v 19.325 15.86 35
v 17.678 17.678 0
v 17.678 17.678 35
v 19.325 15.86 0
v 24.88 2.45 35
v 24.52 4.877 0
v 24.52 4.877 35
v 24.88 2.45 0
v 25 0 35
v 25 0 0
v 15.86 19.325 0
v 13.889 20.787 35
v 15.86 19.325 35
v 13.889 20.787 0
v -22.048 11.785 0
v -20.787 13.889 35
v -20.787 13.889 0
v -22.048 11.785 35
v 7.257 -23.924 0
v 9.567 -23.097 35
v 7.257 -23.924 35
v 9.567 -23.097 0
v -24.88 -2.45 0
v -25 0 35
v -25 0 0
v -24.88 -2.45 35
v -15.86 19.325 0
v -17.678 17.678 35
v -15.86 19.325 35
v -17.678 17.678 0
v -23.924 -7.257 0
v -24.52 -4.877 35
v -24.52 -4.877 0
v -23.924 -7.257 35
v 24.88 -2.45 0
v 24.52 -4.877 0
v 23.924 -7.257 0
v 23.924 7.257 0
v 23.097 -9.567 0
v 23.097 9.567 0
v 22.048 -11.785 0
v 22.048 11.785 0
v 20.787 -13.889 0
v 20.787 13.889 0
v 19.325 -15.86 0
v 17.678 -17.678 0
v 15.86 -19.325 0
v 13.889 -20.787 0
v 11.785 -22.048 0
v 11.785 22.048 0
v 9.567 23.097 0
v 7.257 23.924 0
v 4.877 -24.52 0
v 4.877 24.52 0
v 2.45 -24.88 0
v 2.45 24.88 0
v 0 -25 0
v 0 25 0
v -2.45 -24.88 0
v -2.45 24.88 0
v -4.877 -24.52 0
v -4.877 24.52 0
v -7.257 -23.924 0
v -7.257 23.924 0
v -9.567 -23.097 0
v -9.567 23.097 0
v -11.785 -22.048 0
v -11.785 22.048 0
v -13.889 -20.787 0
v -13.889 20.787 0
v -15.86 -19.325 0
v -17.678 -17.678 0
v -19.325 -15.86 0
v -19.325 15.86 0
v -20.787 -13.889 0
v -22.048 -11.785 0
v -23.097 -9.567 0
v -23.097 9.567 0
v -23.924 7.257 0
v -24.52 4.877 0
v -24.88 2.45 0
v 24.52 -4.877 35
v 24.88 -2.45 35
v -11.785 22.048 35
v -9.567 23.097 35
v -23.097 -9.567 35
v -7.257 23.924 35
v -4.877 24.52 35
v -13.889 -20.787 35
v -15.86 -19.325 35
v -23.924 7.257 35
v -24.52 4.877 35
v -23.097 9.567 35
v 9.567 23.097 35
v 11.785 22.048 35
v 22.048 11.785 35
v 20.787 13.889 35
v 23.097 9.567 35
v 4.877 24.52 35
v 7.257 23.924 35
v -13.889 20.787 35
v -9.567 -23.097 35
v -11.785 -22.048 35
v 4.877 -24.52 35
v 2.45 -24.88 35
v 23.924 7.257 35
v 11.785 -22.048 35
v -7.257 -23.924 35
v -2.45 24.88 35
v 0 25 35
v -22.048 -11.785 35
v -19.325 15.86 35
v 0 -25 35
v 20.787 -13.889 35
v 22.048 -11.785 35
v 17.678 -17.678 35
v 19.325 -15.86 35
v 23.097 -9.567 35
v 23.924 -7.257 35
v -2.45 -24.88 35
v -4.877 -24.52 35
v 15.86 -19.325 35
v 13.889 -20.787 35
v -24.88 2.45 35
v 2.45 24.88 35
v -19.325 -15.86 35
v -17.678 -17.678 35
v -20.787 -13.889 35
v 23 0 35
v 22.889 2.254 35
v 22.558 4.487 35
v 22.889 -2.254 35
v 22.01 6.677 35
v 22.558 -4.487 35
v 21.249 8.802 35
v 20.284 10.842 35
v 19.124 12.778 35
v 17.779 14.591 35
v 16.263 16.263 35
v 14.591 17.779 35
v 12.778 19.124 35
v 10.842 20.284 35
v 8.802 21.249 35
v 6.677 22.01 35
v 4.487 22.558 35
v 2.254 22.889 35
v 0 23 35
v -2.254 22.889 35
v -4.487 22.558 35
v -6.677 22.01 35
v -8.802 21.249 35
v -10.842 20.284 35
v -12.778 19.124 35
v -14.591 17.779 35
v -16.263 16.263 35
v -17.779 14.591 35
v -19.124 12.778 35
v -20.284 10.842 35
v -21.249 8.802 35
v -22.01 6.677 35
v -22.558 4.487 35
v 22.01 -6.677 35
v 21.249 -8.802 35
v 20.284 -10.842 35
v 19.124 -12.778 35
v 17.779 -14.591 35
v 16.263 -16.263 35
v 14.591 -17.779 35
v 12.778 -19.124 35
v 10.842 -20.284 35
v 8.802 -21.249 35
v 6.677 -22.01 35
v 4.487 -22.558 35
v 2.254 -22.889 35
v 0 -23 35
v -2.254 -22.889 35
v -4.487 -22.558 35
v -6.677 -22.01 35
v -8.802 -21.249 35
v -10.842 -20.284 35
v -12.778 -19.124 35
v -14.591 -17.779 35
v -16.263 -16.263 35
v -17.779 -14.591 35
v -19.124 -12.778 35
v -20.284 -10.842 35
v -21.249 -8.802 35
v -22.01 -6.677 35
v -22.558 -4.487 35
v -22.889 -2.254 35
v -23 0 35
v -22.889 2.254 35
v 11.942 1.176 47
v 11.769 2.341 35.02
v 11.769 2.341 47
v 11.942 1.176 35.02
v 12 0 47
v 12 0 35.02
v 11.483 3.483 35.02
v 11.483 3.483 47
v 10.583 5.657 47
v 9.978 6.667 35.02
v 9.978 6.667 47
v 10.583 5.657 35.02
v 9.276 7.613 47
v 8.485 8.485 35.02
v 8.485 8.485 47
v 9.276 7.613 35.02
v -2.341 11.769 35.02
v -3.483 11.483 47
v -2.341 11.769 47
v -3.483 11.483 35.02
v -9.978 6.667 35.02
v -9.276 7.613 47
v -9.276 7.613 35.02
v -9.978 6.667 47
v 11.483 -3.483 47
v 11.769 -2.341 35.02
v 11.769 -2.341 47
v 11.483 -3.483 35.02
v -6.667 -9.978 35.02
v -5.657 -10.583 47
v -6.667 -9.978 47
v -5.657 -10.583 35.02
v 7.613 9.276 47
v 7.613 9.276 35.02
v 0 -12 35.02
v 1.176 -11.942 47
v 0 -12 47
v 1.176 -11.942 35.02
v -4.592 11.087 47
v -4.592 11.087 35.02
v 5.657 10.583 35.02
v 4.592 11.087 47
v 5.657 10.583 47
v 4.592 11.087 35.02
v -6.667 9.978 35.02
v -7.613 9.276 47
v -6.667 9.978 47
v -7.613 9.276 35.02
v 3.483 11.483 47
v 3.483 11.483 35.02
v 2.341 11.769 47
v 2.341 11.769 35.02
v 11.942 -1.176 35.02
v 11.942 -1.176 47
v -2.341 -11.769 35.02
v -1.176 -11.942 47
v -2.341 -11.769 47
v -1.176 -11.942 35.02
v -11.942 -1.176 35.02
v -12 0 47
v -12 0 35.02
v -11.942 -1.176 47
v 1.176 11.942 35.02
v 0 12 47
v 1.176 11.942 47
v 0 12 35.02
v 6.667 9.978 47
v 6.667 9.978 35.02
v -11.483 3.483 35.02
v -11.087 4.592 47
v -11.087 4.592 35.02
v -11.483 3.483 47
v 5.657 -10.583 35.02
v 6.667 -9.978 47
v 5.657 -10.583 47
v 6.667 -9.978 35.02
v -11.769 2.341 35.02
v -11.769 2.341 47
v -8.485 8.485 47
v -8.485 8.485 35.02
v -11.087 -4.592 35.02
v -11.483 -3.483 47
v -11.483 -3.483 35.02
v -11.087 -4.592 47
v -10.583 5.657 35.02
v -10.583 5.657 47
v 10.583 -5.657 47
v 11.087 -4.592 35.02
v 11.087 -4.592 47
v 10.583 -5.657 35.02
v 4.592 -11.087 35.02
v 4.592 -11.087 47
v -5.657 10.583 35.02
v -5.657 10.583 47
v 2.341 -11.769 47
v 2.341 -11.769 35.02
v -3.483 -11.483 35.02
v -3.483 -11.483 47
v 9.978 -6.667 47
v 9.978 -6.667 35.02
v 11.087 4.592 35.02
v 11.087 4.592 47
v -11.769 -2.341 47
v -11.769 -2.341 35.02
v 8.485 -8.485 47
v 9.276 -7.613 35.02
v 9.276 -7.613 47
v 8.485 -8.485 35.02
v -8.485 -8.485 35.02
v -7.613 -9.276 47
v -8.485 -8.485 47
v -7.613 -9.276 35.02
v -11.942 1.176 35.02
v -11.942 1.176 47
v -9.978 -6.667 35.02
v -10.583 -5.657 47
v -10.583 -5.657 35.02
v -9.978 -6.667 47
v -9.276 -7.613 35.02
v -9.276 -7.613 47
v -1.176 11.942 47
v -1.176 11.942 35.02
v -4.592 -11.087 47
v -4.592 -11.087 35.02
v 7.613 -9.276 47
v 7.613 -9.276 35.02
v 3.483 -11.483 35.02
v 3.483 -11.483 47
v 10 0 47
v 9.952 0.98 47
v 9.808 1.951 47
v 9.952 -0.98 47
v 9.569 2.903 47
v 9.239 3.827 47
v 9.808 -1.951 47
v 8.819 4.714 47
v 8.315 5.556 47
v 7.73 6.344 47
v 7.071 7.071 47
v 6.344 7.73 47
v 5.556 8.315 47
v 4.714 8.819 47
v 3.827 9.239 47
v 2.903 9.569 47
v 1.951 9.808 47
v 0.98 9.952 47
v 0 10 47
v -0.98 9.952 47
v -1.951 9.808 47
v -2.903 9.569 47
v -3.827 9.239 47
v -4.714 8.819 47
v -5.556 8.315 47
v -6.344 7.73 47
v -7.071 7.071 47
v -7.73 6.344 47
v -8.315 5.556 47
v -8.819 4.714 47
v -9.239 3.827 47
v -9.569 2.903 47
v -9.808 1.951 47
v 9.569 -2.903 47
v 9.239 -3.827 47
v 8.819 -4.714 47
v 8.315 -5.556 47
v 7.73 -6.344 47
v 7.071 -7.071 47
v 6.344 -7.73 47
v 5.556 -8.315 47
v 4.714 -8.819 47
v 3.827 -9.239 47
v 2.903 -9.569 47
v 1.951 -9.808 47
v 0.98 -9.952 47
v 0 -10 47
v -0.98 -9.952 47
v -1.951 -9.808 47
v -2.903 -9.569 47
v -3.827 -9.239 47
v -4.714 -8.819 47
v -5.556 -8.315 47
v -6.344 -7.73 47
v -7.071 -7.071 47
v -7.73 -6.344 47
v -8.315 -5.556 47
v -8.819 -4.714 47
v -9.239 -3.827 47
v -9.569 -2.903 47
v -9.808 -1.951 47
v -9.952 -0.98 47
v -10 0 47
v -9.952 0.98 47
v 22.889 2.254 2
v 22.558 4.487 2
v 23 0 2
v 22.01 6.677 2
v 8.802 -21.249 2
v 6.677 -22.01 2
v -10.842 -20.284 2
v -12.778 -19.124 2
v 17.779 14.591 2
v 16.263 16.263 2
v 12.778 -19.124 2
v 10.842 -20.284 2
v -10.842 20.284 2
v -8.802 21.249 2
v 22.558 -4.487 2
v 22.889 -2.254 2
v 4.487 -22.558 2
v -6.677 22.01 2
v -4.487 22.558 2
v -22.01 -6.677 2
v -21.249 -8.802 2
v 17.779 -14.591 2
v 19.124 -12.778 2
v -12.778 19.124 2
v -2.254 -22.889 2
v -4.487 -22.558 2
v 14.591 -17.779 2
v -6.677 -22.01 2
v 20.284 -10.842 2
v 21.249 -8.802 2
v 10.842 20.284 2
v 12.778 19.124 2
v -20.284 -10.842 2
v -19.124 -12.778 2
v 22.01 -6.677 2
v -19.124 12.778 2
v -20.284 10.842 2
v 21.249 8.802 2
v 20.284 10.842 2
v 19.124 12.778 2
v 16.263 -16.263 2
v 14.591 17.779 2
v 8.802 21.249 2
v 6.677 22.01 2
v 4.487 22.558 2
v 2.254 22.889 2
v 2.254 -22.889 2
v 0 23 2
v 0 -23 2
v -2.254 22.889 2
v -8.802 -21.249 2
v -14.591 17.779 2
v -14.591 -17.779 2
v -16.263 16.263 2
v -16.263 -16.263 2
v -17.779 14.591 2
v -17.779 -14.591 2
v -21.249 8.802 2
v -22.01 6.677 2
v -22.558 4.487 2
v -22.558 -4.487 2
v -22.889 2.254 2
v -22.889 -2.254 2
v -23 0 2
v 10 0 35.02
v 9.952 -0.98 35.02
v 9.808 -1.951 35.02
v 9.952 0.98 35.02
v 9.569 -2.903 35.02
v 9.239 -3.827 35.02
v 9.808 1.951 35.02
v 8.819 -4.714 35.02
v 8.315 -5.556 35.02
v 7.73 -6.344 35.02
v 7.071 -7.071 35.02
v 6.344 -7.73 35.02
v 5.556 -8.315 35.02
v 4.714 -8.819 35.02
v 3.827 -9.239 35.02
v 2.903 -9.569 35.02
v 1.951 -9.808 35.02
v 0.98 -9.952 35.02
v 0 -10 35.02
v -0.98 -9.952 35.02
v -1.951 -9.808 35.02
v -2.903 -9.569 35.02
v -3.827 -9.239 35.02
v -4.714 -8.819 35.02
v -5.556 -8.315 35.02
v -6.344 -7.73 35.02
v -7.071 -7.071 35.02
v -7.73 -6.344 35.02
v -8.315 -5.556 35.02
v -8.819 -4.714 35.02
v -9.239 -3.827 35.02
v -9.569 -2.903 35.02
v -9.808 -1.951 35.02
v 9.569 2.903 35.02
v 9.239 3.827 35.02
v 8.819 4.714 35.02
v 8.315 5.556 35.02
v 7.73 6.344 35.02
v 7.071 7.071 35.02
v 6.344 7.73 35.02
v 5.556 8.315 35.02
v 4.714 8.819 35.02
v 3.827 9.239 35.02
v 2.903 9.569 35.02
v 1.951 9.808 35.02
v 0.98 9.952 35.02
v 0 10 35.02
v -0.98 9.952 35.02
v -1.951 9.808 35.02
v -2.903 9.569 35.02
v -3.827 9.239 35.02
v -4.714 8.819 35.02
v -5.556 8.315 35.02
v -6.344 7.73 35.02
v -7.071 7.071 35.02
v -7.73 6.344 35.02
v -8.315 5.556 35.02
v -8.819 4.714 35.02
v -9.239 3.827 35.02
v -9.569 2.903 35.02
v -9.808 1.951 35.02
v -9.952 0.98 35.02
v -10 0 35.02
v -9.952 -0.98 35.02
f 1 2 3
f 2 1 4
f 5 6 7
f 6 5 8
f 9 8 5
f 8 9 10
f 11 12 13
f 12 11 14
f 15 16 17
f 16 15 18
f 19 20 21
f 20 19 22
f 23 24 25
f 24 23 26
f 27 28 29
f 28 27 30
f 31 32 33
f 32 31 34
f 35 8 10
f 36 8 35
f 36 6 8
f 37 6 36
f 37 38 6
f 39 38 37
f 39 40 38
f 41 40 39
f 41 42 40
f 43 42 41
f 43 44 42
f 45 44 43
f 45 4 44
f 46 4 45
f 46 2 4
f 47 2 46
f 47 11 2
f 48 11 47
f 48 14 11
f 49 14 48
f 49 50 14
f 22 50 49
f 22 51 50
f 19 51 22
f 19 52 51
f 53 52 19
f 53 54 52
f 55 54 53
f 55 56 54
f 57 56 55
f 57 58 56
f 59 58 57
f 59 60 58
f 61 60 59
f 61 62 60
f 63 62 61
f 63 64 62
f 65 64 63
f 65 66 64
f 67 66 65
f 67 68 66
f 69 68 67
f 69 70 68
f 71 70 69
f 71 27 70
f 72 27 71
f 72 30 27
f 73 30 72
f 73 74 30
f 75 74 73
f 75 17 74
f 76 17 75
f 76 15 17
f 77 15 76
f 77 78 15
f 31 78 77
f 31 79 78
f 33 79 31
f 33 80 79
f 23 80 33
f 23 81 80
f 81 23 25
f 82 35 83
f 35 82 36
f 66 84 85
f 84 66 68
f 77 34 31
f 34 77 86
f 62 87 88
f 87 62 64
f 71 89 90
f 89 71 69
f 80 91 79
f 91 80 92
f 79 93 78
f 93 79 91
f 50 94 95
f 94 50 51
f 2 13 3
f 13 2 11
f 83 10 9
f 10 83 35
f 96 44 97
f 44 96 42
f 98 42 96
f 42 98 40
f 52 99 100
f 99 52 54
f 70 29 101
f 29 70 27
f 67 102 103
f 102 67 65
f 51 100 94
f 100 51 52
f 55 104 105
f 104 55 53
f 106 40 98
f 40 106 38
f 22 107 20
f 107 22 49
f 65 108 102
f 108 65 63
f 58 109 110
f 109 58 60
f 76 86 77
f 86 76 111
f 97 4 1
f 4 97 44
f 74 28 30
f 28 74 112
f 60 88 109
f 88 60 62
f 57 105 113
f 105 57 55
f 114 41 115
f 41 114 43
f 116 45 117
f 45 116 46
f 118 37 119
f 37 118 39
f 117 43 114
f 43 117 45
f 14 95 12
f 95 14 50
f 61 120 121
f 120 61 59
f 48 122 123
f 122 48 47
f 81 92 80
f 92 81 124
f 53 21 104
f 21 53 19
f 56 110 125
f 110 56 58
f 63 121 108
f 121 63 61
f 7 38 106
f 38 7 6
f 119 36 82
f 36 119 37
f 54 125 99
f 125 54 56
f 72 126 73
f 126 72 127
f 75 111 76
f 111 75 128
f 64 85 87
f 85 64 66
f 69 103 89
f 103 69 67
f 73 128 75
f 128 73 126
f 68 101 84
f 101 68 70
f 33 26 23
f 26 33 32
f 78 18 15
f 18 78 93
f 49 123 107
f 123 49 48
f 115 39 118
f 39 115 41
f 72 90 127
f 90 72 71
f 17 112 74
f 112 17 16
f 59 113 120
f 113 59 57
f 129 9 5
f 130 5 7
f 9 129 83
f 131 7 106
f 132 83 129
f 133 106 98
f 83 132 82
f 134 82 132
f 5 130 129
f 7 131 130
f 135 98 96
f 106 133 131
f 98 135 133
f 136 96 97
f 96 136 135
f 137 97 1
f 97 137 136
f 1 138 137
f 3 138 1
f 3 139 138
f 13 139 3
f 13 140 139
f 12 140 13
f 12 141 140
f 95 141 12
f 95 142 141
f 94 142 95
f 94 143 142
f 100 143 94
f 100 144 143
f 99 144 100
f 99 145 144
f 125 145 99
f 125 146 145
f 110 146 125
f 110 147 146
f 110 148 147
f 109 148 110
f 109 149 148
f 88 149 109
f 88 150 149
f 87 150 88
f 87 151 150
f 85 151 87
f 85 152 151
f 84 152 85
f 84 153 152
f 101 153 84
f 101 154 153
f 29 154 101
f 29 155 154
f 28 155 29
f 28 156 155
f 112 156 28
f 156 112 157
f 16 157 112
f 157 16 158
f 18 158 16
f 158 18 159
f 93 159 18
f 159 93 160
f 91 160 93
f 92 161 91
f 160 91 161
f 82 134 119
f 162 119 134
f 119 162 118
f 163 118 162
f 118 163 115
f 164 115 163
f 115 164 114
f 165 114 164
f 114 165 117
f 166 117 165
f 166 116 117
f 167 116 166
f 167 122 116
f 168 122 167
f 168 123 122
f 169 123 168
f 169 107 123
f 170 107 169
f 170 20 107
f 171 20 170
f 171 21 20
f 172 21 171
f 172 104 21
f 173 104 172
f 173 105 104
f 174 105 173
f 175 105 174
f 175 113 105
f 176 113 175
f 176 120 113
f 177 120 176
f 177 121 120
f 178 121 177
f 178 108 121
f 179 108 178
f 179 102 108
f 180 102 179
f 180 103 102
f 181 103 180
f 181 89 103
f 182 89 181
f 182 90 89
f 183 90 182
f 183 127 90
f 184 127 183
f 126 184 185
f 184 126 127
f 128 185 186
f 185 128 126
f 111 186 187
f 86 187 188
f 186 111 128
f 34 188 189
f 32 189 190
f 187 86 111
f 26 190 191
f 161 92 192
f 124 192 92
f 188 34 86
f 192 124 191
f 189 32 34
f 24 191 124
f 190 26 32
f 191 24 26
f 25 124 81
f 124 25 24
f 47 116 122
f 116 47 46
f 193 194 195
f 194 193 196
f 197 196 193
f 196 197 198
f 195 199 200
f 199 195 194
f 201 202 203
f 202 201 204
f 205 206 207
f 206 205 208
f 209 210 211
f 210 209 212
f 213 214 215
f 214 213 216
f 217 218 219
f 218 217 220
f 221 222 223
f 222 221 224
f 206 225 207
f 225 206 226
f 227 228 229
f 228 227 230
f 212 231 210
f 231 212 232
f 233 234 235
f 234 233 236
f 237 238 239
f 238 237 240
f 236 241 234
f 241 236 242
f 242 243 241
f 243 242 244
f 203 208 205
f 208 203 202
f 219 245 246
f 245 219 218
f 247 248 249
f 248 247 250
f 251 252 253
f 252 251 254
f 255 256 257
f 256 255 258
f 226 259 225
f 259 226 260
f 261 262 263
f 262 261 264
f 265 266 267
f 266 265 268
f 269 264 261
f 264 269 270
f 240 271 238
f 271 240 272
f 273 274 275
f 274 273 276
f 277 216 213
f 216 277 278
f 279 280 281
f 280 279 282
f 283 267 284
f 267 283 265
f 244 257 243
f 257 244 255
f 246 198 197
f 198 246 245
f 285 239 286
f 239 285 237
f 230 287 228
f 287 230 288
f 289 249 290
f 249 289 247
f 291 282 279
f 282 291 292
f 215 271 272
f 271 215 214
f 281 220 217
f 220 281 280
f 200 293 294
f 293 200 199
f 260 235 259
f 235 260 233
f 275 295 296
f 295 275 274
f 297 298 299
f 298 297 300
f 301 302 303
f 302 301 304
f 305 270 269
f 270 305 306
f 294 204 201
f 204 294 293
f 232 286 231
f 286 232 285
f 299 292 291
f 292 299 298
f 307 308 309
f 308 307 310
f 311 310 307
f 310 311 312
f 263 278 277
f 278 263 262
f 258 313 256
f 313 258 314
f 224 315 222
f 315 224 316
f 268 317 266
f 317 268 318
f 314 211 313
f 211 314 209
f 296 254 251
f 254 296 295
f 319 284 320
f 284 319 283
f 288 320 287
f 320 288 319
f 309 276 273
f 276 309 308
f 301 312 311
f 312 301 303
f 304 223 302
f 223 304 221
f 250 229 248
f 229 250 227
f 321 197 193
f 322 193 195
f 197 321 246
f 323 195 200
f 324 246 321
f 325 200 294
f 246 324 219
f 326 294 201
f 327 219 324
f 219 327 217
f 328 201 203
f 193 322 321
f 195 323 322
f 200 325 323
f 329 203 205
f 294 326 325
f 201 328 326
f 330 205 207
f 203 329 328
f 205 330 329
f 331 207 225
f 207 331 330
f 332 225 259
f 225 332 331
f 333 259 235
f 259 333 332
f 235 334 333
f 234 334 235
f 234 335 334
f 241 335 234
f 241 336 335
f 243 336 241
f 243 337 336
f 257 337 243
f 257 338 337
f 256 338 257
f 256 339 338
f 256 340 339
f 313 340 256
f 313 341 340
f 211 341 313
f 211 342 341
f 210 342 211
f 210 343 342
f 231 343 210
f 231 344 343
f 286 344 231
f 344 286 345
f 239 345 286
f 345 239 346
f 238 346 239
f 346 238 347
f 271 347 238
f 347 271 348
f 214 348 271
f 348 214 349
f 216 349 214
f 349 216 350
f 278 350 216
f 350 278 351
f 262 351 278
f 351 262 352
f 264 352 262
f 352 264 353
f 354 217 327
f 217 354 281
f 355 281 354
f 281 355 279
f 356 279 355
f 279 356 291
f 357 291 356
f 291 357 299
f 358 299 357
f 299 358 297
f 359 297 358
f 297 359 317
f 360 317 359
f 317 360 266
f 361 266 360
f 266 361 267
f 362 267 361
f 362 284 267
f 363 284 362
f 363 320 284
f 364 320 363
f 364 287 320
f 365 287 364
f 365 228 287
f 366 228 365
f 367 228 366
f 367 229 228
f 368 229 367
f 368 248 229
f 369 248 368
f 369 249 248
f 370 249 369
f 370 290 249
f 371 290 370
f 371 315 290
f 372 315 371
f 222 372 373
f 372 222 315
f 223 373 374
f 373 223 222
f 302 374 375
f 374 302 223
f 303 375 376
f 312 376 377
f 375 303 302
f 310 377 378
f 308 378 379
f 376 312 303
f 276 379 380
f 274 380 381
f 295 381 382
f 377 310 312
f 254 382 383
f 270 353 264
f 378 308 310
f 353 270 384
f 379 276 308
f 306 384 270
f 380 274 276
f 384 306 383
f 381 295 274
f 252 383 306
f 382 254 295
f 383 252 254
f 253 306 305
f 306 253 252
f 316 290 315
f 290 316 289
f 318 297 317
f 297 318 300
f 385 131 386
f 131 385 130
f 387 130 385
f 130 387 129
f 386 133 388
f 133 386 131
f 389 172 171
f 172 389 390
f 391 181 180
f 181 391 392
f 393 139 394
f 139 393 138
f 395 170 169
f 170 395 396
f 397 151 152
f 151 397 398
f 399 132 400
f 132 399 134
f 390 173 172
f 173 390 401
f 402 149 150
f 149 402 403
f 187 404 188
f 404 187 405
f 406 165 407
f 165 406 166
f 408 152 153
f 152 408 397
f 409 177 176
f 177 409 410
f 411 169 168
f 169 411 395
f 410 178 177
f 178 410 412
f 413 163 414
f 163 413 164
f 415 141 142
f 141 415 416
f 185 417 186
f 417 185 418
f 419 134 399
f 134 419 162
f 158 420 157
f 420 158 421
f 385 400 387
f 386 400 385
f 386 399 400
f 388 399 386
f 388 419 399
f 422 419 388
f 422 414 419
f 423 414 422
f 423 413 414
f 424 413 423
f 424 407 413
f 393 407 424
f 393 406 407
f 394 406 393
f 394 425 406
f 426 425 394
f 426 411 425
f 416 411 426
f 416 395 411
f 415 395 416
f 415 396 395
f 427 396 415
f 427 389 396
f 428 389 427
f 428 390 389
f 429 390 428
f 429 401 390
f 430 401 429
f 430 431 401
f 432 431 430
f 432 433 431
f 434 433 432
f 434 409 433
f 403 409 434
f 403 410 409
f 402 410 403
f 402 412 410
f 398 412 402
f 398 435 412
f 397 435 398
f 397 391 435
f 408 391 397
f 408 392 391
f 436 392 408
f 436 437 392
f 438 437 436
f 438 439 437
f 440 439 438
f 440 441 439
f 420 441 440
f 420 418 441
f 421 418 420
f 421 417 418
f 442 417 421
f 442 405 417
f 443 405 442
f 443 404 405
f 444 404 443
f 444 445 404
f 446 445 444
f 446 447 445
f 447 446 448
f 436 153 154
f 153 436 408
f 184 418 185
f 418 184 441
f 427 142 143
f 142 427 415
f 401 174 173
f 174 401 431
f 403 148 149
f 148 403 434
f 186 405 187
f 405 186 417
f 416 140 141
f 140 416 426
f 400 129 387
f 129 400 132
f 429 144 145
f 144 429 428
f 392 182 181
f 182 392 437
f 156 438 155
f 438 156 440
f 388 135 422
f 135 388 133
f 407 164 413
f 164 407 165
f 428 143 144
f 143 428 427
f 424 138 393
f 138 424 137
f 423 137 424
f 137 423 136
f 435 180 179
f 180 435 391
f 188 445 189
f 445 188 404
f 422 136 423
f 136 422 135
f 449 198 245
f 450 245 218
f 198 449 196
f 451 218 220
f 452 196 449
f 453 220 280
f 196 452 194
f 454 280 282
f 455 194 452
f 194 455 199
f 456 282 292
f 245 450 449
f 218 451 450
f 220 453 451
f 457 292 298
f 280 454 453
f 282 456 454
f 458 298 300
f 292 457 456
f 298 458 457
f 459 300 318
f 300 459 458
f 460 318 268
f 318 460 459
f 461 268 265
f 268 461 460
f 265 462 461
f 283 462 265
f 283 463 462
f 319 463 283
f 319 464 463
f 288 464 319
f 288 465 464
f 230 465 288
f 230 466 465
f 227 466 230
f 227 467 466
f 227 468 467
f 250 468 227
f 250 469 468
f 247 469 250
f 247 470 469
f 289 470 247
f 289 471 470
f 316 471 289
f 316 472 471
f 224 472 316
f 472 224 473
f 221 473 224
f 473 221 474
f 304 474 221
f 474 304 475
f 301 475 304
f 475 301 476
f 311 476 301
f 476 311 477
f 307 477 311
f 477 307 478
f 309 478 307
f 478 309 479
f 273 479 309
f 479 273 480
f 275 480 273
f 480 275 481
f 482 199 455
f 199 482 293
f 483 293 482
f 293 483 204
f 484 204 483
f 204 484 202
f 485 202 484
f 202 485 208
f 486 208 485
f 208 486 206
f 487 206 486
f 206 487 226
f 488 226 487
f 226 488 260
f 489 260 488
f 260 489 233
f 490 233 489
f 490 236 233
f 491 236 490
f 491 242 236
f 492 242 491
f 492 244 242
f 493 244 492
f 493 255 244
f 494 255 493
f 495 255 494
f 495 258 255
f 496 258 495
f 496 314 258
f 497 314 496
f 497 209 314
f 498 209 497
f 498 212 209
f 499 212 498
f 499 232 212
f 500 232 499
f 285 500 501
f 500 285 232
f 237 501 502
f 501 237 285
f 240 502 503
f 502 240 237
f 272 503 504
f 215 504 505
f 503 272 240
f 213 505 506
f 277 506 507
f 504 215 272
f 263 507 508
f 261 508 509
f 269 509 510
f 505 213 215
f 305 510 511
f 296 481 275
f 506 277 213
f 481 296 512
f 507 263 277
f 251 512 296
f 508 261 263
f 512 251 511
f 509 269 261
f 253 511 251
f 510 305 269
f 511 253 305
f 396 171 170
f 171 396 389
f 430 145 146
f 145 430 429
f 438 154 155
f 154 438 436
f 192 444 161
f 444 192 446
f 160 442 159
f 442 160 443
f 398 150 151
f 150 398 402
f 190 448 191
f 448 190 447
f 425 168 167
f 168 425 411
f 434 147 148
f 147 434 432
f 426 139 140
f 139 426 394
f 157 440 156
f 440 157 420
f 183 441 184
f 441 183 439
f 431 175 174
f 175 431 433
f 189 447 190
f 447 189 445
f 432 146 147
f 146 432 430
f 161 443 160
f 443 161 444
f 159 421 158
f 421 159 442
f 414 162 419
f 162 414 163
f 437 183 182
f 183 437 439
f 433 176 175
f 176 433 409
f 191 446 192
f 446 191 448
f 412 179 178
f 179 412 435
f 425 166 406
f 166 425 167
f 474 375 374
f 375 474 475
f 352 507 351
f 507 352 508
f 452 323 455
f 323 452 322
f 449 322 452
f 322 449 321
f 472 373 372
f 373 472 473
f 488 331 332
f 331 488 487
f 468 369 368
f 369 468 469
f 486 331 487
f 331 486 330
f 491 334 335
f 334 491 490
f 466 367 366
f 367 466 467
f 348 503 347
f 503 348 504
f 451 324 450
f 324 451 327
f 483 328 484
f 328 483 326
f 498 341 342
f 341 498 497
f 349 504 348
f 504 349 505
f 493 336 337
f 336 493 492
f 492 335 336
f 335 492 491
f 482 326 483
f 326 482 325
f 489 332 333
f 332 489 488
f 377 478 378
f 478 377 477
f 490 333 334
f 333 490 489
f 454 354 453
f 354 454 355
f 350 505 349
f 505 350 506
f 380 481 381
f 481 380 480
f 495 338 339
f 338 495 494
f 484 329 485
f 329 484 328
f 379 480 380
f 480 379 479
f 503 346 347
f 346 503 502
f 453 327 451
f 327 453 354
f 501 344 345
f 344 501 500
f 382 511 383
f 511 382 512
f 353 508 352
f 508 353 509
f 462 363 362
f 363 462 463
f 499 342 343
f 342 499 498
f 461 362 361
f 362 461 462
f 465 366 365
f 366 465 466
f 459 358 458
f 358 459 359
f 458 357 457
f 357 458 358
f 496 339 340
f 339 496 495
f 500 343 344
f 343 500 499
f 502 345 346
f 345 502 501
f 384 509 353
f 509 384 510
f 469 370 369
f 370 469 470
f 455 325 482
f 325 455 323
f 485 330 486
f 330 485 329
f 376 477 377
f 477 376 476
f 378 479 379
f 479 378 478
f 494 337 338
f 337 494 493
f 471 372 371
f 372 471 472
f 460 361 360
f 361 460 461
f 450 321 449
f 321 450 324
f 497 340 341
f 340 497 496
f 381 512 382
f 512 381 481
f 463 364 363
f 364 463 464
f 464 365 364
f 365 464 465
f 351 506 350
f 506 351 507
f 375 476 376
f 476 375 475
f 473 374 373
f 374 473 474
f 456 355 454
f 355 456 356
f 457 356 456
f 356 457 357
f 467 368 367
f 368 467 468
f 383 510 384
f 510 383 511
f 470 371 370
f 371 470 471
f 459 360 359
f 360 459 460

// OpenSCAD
// expect: starts in mid-air at z = 35 mm
// The cavity is cut up through the top (h + epsilon), so the neck has nothing under it.
body_r = 25;
body_h = 35;
wall = 2;
neck_r = 12;
neck_h = 12;
epsilon = 0.02;
$fn = 64;
difference() {
    union() {
        cylinder(r = body_r, h = body_h);
        translate([0, 0, body_h]) cylinder(r = neck_r, h = neck_h);
    }
    translate([0, 0, wall]) cylinder(r = body_r - wall, h = body_h - wall + epsilon);
    translate([0, 0, body_h]) cylinder(r = neck_r - wall, h = neck_h + epsilon);
}
